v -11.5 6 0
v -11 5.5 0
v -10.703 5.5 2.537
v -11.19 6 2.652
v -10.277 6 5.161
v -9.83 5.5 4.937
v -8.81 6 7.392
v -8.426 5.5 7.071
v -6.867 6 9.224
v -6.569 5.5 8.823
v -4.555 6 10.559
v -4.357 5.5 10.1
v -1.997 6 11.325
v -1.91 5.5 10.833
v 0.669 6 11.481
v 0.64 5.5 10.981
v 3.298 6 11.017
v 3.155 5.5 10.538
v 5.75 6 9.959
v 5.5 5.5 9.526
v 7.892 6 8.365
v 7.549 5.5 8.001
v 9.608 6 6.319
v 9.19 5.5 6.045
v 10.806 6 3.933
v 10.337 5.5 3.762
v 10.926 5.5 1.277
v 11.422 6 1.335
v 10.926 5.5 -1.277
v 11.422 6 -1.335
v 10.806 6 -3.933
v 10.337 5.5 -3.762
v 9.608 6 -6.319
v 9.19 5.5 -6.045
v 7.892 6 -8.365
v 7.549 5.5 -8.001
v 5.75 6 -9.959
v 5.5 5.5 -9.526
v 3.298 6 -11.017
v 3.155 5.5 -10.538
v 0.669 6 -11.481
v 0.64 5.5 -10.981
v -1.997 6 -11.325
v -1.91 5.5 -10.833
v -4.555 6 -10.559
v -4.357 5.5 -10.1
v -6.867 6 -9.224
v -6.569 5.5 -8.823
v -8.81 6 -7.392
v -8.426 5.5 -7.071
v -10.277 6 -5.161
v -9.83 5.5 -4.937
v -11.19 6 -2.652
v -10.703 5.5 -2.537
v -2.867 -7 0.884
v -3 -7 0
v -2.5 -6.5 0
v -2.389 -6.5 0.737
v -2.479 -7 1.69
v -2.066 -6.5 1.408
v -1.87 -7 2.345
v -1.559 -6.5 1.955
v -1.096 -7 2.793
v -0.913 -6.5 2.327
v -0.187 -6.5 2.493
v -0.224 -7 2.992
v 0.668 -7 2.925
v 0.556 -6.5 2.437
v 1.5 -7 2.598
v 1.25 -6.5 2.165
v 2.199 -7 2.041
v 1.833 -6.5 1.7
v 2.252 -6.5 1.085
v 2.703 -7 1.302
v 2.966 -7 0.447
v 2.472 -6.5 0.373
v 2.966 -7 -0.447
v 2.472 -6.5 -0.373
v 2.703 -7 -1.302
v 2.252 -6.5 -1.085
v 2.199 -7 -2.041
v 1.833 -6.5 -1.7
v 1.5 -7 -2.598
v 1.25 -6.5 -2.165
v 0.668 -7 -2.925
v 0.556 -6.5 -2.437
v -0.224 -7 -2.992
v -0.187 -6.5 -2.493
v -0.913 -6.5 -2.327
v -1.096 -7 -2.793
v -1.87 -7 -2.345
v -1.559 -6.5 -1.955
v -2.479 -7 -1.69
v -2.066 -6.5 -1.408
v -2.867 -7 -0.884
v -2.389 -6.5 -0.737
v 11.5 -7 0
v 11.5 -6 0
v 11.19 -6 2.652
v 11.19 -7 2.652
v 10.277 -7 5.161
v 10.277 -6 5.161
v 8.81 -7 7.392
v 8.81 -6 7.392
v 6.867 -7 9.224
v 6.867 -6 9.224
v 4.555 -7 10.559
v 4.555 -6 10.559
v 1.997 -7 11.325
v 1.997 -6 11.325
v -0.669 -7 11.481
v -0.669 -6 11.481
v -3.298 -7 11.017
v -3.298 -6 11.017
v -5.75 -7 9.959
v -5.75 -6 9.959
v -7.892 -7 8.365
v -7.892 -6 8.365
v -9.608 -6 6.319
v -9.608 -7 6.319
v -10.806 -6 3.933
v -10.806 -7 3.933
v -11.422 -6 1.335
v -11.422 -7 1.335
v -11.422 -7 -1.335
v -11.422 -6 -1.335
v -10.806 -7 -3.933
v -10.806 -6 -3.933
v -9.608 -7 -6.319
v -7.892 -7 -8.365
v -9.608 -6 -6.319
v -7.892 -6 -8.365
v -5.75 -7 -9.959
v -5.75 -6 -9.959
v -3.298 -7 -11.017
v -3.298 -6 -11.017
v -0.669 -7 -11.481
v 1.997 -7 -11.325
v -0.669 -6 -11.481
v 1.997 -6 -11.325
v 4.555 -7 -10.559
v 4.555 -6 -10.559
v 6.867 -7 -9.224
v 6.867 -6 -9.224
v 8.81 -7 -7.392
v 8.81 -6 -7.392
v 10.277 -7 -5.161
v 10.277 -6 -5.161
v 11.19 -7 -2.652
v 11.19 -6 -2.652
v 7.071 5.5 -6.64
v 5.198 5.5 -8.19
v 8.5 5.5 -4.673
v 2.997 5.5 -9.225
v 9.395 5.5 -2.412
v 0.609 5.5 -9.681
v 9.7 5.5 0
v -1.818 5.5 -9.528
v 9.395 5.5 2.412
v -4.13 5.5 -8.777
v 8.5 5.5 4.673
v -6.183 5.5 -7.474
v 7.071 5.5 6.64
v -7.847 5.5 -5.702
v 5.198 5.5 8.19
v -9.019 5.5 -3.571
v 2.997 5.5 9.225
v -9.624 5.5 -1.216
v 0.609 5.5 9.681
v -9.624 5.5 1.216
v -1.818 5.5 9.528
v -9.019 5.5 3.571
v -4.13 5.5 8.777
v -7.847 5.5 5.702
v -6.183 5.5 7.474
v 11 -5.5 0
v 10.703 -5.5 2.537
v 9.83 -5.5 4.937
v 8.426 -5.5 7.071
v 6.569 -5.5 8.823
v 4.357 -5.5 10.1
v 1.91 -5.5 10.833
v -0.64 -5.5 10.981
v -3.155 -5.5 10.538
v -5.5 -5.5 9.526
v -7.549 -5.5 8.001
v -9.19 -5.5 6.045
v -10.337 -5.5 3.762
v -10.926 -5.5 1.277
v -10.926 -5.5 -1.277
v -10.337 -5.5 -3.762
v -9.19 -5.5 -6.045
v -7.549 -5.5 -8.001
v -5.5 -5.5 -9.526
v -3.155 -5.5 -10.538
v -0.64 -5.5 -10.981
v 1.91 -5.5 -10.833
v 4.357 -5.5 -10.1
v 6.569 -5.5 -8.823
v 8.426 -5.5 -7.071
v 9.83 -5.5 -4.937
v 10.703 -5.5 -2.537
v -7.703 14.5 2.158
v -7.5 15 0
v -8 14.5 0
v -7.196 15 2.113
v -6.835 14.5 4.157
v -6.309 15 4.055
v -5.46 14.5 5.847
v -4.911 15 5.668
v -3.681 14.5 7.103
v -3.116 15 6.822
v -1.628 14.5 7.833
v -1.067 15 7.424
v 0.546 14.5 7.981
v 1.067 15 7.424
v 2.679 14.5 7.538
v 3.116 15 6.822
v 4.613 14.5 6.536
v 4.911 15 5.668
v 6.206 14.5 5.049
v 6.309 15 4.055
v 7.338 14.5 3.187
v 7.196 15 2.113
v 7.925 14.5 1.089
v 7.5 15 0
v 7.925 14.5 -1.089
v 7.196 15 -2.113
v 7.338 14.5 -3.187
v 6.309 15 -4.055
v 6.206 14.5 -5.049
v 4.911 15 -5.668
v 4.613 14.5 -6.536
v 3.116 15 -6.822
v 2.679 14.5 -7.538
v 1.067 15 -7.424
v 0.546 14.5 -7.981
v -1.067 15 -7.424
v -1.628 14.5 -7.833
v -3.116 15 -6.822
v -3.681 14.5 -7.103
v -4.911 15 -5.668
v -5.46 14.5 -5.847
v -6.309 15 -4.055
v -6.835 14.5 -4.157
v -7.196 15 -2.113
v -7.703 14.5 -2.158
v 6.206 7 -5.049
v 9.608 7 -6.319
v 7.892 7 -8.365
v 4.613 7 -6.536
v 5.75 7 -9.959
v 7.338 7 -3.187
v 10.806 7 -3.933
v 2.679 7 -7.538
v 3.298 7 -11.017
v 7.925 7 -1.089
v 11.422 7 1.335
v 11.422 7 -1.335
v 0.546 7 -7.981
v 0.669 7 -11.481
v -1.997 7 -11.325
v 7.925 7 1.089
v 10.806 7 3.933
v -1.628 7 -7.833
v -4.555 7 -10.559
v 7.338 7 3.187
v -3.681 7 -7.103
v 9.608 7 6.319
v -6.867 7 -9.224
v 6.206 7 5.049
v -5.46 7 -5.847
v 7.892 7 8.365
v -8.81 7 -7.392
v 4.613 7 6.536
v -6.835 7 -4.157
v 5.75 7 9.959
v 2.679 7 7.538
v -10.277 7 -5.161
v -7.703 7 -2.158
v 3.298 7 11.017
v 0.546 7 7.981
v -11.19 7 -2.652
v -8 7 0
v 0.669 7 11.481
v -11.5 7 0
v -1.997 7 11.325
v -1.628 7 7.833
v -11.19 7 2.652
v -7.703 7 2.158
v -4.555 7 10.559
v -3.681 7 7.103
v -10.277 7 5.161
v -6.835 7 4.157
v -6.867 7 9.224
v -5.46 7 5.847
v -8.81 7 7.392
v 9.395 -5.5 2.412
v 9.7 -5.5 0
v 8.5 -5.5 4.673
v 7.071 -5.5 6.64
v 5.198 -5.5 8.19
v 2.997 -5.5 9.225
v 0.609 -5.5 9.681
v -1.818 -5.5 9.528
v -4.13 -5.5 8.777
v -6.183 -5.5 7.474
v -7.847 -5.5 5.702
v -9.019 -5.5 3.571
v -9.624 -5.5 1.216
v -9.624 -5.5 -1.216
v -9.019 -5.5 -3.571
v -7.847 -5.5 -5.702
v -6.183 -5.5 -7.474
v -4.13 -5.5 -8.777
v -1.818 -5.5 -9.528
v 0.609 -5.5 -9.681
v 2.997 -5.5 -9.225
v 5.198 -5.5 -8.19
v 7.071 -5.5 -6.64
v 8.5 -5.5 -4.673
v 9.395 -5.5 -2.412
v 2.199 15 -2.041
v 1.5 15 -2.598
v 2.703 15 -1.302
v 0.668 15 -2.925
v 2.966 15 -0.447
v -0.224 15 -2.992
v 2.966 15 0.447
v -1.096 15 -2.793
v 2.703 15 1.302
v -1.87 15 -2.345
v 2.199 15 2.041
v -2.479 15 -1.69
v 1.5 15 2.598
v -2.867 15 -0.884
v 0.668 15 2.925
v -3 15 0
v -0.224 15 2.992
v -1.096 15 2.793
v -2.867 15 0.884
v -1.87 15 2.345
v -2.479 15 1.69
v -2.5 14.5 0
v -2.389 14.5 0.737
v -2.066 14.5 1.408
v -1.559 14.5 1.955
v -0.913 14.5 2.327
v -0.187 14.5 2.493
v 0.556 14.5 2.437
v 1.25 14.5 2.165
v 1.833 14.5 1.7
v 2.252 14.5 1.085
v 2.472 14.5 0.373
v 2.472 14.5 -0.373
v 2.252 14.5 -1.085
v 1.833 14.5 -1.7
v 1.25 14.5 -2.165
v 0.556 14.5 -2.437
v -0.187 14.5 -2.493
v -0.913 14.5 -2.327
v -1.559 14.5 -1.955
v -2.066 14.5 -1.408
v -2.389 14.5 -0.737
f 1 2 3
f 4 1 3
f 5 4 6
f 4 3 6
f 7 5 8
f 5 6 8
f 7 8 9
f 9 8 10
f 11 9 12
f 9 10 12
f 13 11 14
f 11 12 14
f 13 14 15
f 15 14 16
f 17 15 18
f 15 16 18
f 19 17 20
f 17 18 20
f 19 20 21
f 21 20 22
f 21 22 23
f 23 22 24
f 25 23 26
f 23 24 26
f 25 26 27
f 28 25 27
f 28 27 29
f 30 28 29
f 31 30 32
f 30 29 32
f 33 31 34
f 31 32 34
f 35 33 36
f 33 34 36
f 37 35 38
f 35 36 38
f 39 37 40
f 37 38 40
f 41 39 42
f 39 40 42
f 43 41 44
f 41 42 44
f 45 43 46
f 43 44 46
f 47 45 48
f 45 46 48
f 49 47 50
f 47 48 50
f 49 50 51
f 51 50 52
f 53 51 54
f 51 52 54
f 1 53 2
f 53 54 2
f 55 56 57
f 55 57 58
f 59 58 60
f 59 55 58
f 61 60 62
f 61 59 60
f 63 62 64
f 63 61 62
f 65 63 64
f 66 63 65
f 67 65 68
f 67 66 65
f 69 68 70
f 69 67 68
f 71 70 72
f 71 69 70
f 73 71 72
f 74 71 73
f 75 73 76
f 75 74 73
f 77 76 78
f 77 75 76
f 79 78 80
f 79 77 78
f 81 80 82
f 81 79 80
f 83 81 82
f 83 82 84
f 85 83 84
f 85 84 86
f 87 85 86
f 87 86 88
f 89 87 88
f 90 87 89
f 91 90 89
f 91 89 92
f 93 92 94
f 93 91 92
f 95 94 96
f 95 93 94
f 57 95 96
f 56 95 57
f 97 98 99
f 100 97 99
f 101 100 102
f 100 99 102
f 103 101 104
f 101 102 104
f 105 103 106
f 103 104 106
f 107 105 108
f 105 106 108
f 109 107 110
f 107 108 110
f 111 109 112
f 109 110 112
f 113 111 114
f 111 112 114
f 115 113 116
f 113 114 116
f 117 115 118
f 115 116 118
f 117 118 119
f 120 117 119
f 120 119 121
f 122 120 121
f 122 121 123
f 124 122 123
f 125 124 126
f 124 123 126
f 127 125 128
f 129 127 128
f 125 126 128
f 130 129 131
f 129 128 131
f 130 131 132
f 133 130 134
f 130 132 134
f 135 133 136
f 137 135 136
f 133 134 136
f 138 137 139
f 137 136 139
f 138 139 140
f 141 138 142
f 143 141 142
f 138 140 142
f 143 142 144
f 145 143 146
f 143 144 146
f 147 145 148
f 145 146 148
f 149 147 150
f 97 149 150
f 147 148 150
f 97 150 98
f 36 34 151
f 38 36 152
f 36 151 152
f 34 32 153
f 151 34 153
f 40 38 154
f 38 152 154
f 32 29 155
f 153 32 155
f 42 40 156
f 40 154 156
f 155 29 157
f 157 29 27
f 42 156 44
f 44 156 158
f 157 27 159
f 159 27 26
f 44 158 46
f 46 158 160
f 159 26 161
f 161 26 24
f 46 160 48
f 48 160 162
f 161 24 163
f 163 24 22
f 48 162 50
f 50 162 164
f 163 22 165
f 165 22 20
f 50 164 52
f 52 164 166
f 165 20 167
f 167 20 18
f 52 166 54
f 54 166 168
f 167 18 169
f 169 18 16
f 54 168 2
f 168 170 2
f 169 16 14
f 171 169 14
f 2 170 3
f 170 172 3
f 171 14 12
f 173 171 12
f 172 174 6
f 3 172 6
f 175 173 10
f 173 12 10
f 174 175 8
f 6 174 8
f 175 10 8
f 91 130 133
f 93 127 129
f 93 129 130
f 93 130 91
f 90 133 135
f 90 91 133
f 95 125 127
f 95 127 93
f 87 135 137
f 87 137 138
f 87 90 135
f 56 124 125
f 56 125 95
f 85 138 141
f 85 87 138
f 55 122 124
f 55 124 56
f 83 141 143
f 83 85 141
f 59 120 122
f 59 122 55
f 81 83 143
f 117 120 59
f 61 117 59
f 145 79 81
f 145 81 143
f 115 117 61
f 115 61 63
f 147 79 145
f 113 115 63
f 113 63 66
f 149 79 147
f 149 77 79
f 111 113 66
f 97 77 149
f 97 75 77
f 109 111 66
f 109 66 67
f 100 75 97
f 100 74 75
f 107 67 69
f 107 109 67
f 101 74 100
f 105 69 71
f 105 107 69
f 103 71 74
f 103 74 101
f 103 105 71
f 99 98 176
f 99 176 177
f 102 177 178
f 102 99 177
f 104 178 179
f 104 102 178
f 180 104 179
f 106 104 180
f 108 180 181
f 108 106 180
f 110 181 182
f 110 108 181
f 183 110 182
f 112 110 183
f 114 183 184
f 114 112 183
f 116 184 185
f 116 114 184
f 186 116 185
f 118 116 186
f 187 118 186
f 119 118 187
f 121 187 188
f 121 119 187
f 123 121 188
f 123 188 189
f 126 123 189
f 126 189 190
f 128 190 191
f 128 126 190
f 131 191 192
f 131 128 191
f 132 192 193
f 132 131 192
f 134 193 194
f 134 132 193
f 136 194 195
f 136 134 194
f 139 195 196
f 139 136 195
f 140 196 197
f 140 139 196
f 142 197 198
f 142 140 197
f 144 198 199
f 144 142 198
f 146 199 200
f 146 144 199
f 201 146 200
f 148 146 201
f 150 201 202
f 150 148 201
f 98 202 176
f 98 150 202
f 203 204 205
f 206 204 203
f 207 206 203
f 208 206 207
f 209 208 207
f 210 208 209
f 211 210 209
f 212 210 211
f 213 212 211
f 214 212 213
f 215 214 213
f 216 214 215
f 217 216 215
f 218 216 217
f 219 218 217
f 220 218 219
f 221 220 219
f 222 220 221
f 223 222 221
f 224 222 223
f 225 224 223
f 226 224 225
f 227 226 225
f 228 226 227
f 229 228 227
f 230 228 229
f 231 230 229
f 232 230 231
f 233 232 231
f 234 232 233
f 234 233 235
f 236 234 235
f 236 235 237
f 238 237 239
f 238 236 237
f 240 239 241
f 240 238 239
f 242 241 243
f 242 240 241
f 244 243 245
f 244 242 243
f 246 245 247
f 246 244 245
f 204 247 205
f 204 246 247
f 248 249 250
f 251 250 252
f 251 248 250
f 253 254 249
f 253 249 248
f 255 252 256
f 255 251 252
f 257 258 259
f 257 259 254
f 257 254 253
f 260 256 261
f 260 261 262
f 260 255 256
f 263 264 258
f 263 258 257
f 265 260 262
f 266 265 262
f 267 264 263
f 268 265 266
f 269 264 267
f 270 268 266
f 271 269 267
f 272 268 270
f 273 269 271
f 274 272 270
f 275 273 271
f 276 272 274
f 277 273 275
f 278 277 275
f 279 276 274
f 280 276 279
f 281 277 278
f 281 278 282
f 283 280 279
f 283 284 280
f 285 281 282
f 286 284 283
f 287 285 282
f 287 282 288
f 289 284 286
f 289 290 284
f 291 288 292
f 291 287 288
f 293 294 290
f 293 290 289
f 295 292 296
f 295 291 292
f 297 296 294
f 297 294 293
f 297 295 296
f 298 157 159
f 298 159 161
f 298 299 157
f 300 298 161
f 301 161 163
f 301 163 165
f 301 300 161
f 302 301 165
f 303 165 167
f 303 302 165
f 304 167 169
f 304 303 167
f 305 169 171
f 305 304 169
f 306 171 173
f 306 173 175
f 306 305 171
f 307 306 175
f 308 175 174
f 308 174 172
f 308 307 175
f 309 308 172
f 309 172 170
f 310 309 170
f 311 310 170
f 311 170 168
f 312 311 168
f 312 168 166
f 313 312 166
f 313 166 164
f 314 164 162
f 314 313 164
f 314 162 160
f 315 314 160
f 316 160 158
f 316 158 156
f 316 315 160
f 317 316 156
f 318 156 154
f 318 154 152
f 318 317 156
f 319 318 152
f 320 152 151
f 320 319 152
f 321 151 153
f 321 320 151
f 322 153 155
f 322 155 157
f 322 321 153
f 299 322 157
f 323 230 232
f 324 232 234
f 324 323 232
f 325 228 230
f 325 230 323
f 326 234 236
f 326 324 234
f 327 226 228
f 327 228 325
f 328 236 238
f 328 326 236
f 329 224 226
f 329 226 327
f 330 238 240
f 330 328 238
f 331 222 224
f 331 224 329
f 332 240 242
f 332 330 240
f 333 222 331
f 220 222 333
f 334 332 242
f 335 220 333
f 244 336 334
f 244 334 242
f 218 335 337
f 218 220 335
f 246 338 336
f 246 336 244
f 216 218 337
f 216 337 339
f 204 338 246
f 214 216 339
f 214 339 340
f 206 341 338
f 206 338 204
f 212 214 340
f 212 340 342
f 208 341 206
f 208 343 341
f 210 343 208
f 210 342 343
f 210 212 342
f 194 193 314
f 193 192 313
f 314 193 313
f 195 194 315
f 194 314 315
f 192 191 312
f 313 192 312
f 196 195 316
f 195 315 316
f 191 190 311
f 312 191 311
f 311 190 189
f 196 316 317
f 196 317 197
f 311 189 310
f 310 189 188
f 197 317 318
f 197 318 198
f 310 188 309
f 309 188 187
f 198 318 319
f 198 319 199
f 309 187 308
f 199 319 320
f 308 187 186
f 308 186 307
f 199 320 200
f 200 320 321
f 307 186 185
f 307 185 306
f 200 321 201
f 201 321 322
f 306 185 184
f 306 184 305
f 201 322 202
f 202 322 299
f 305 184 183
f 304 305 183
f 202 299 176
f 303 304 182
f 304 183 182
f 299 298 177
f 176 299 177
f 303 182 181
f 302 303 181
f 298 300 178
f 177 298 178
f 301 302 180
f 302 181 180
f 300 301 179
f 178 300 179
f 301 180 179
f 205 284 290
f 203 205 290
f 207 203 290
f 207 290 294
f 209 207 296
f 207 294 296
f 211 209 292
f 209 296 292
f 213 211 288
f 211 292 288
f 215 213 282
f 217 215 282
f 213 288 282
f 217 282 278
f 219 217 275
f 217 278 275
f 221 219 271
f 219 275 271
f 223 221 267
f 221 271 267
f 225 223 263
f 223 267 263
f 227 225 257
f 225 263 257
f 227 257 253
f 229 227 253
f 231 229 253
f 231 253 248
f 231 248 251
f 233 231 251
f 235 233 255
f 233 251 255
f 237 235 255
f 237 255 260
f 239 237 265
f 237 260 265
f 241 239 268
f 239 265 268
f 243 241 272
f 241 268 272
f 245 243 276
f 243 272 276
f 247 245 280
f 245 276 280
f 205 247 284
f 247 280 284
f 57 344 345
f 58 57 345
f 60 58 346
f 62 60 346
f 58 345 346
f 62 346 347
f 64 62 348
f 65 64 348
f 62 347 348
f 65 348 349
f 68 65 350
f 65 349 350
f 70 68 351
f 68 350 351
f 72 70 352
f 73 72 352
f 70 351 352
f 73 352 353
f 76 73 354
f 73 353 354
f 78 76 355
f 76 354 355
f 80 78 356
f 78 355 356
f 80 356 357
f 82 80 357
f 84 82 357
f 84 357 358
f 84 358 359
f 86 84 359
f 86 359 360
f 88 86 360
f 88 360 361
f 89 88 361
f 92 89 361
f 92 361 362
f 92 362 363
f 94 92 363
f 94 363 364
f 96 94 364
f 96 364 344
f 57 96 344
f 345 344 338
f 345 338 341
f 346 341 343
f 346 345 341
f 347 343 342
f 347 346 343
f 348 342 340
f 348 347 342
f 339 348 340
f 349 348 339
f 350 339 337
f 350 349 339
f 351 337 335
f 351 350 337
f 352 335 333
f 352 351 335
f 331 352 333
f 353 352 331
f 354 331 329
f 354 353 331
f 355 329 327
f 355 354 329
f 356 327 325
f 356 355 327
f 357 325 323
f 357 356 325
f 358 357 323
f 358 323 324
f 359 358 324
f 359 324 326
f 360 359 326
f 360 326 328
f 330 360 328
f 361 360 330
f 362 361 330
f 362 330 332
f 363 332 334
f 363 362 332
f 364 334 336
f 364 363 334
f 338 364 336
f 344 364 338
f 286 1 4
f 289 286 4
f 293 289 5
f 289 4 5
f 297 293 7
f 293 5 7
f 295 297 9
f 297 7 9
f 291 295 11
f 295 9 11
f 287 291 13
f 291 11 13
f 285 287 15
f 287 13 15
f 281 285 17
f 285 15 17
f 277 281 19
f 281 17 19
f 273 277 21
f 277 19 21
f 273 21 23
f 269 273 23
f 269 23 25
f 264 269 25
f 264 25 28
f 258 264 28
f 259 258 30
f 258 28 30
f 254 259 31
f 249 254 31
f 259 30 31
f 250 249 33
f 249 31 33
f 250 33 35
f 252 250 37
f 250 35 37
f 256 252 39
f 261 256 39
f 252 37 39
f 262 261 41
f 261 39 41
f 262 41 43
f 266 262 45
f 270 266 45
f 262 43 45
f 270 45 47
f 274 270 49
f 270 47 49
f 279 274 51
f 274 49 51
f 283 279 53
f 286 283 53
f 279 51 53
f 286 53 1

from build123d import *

# Parameters (mm, degrees)
F0_R     = 9.7
F1_DEPTH = 5.5
F2_R     = 11.5
F3_DEPTH = 1.5
F4_R     = 11.5
F5_DEPTH = 1.5
F6_R     = 8
F7_DEPTH = 8
F8_R     = 2.5
F9_DEPTH = 22.001
F10_SIZE = 0.5


with BuildPart() as f1:
    # F0 (on Front) → F1 (new body, symmetric)
    with BuildSketch(Plane.XZ):
        Circle(F0_R)
    extrude(amount=F1_DEPTH, both=True)

    # F2 (on face) → F3 (join)
    with BuildSketch(Plane.XZ.offset(5.5)):
        Circle(F2_R)
    extrude(amount=F3_DEPTH)

    # F4 (on face) → F5 (join)
    with BuildSketch(Plane(origin=(0, 5.5, 0), x_dir=(-1, 0, 0), z_dir=(0, 1, 0))):
        Circle(F4_R)
    extrude(amount=F5_DEPTH)

    # F6 (on face) → F7 (join)
    with BuildSketch(Plane(origin=(0, 7, 0), x_dir=(-1, 0, 0), z_dir=(0, 1, 0))):
        Circle(F6_R)
    extrude(amount=F7_DEPTH)

    # F8 (on face) → F9 (cut, through all)
    with BuildSketch(Plane(origin=(0, 15, 0), x_dir=(-1, 0, 0), z_dir=(0, 1, 0))):
        Circle(F8_R)
    extrude(amount=-F9_DEPTH, mode=Mode.SUBTRACT)

    # F10
    f10_edges = [f1.edges().sort_by_distance(p)[0] for p in [
        (2.5, -7, 0),
        (2.5, 15, 0),
        (-11.5, -5.5, 0),
        (11.5, 5.5, 0),
        (8, 15, 0),
    ]]
    chamfer(f10_edges, length=F10_SIZE)


solid = f1.part
